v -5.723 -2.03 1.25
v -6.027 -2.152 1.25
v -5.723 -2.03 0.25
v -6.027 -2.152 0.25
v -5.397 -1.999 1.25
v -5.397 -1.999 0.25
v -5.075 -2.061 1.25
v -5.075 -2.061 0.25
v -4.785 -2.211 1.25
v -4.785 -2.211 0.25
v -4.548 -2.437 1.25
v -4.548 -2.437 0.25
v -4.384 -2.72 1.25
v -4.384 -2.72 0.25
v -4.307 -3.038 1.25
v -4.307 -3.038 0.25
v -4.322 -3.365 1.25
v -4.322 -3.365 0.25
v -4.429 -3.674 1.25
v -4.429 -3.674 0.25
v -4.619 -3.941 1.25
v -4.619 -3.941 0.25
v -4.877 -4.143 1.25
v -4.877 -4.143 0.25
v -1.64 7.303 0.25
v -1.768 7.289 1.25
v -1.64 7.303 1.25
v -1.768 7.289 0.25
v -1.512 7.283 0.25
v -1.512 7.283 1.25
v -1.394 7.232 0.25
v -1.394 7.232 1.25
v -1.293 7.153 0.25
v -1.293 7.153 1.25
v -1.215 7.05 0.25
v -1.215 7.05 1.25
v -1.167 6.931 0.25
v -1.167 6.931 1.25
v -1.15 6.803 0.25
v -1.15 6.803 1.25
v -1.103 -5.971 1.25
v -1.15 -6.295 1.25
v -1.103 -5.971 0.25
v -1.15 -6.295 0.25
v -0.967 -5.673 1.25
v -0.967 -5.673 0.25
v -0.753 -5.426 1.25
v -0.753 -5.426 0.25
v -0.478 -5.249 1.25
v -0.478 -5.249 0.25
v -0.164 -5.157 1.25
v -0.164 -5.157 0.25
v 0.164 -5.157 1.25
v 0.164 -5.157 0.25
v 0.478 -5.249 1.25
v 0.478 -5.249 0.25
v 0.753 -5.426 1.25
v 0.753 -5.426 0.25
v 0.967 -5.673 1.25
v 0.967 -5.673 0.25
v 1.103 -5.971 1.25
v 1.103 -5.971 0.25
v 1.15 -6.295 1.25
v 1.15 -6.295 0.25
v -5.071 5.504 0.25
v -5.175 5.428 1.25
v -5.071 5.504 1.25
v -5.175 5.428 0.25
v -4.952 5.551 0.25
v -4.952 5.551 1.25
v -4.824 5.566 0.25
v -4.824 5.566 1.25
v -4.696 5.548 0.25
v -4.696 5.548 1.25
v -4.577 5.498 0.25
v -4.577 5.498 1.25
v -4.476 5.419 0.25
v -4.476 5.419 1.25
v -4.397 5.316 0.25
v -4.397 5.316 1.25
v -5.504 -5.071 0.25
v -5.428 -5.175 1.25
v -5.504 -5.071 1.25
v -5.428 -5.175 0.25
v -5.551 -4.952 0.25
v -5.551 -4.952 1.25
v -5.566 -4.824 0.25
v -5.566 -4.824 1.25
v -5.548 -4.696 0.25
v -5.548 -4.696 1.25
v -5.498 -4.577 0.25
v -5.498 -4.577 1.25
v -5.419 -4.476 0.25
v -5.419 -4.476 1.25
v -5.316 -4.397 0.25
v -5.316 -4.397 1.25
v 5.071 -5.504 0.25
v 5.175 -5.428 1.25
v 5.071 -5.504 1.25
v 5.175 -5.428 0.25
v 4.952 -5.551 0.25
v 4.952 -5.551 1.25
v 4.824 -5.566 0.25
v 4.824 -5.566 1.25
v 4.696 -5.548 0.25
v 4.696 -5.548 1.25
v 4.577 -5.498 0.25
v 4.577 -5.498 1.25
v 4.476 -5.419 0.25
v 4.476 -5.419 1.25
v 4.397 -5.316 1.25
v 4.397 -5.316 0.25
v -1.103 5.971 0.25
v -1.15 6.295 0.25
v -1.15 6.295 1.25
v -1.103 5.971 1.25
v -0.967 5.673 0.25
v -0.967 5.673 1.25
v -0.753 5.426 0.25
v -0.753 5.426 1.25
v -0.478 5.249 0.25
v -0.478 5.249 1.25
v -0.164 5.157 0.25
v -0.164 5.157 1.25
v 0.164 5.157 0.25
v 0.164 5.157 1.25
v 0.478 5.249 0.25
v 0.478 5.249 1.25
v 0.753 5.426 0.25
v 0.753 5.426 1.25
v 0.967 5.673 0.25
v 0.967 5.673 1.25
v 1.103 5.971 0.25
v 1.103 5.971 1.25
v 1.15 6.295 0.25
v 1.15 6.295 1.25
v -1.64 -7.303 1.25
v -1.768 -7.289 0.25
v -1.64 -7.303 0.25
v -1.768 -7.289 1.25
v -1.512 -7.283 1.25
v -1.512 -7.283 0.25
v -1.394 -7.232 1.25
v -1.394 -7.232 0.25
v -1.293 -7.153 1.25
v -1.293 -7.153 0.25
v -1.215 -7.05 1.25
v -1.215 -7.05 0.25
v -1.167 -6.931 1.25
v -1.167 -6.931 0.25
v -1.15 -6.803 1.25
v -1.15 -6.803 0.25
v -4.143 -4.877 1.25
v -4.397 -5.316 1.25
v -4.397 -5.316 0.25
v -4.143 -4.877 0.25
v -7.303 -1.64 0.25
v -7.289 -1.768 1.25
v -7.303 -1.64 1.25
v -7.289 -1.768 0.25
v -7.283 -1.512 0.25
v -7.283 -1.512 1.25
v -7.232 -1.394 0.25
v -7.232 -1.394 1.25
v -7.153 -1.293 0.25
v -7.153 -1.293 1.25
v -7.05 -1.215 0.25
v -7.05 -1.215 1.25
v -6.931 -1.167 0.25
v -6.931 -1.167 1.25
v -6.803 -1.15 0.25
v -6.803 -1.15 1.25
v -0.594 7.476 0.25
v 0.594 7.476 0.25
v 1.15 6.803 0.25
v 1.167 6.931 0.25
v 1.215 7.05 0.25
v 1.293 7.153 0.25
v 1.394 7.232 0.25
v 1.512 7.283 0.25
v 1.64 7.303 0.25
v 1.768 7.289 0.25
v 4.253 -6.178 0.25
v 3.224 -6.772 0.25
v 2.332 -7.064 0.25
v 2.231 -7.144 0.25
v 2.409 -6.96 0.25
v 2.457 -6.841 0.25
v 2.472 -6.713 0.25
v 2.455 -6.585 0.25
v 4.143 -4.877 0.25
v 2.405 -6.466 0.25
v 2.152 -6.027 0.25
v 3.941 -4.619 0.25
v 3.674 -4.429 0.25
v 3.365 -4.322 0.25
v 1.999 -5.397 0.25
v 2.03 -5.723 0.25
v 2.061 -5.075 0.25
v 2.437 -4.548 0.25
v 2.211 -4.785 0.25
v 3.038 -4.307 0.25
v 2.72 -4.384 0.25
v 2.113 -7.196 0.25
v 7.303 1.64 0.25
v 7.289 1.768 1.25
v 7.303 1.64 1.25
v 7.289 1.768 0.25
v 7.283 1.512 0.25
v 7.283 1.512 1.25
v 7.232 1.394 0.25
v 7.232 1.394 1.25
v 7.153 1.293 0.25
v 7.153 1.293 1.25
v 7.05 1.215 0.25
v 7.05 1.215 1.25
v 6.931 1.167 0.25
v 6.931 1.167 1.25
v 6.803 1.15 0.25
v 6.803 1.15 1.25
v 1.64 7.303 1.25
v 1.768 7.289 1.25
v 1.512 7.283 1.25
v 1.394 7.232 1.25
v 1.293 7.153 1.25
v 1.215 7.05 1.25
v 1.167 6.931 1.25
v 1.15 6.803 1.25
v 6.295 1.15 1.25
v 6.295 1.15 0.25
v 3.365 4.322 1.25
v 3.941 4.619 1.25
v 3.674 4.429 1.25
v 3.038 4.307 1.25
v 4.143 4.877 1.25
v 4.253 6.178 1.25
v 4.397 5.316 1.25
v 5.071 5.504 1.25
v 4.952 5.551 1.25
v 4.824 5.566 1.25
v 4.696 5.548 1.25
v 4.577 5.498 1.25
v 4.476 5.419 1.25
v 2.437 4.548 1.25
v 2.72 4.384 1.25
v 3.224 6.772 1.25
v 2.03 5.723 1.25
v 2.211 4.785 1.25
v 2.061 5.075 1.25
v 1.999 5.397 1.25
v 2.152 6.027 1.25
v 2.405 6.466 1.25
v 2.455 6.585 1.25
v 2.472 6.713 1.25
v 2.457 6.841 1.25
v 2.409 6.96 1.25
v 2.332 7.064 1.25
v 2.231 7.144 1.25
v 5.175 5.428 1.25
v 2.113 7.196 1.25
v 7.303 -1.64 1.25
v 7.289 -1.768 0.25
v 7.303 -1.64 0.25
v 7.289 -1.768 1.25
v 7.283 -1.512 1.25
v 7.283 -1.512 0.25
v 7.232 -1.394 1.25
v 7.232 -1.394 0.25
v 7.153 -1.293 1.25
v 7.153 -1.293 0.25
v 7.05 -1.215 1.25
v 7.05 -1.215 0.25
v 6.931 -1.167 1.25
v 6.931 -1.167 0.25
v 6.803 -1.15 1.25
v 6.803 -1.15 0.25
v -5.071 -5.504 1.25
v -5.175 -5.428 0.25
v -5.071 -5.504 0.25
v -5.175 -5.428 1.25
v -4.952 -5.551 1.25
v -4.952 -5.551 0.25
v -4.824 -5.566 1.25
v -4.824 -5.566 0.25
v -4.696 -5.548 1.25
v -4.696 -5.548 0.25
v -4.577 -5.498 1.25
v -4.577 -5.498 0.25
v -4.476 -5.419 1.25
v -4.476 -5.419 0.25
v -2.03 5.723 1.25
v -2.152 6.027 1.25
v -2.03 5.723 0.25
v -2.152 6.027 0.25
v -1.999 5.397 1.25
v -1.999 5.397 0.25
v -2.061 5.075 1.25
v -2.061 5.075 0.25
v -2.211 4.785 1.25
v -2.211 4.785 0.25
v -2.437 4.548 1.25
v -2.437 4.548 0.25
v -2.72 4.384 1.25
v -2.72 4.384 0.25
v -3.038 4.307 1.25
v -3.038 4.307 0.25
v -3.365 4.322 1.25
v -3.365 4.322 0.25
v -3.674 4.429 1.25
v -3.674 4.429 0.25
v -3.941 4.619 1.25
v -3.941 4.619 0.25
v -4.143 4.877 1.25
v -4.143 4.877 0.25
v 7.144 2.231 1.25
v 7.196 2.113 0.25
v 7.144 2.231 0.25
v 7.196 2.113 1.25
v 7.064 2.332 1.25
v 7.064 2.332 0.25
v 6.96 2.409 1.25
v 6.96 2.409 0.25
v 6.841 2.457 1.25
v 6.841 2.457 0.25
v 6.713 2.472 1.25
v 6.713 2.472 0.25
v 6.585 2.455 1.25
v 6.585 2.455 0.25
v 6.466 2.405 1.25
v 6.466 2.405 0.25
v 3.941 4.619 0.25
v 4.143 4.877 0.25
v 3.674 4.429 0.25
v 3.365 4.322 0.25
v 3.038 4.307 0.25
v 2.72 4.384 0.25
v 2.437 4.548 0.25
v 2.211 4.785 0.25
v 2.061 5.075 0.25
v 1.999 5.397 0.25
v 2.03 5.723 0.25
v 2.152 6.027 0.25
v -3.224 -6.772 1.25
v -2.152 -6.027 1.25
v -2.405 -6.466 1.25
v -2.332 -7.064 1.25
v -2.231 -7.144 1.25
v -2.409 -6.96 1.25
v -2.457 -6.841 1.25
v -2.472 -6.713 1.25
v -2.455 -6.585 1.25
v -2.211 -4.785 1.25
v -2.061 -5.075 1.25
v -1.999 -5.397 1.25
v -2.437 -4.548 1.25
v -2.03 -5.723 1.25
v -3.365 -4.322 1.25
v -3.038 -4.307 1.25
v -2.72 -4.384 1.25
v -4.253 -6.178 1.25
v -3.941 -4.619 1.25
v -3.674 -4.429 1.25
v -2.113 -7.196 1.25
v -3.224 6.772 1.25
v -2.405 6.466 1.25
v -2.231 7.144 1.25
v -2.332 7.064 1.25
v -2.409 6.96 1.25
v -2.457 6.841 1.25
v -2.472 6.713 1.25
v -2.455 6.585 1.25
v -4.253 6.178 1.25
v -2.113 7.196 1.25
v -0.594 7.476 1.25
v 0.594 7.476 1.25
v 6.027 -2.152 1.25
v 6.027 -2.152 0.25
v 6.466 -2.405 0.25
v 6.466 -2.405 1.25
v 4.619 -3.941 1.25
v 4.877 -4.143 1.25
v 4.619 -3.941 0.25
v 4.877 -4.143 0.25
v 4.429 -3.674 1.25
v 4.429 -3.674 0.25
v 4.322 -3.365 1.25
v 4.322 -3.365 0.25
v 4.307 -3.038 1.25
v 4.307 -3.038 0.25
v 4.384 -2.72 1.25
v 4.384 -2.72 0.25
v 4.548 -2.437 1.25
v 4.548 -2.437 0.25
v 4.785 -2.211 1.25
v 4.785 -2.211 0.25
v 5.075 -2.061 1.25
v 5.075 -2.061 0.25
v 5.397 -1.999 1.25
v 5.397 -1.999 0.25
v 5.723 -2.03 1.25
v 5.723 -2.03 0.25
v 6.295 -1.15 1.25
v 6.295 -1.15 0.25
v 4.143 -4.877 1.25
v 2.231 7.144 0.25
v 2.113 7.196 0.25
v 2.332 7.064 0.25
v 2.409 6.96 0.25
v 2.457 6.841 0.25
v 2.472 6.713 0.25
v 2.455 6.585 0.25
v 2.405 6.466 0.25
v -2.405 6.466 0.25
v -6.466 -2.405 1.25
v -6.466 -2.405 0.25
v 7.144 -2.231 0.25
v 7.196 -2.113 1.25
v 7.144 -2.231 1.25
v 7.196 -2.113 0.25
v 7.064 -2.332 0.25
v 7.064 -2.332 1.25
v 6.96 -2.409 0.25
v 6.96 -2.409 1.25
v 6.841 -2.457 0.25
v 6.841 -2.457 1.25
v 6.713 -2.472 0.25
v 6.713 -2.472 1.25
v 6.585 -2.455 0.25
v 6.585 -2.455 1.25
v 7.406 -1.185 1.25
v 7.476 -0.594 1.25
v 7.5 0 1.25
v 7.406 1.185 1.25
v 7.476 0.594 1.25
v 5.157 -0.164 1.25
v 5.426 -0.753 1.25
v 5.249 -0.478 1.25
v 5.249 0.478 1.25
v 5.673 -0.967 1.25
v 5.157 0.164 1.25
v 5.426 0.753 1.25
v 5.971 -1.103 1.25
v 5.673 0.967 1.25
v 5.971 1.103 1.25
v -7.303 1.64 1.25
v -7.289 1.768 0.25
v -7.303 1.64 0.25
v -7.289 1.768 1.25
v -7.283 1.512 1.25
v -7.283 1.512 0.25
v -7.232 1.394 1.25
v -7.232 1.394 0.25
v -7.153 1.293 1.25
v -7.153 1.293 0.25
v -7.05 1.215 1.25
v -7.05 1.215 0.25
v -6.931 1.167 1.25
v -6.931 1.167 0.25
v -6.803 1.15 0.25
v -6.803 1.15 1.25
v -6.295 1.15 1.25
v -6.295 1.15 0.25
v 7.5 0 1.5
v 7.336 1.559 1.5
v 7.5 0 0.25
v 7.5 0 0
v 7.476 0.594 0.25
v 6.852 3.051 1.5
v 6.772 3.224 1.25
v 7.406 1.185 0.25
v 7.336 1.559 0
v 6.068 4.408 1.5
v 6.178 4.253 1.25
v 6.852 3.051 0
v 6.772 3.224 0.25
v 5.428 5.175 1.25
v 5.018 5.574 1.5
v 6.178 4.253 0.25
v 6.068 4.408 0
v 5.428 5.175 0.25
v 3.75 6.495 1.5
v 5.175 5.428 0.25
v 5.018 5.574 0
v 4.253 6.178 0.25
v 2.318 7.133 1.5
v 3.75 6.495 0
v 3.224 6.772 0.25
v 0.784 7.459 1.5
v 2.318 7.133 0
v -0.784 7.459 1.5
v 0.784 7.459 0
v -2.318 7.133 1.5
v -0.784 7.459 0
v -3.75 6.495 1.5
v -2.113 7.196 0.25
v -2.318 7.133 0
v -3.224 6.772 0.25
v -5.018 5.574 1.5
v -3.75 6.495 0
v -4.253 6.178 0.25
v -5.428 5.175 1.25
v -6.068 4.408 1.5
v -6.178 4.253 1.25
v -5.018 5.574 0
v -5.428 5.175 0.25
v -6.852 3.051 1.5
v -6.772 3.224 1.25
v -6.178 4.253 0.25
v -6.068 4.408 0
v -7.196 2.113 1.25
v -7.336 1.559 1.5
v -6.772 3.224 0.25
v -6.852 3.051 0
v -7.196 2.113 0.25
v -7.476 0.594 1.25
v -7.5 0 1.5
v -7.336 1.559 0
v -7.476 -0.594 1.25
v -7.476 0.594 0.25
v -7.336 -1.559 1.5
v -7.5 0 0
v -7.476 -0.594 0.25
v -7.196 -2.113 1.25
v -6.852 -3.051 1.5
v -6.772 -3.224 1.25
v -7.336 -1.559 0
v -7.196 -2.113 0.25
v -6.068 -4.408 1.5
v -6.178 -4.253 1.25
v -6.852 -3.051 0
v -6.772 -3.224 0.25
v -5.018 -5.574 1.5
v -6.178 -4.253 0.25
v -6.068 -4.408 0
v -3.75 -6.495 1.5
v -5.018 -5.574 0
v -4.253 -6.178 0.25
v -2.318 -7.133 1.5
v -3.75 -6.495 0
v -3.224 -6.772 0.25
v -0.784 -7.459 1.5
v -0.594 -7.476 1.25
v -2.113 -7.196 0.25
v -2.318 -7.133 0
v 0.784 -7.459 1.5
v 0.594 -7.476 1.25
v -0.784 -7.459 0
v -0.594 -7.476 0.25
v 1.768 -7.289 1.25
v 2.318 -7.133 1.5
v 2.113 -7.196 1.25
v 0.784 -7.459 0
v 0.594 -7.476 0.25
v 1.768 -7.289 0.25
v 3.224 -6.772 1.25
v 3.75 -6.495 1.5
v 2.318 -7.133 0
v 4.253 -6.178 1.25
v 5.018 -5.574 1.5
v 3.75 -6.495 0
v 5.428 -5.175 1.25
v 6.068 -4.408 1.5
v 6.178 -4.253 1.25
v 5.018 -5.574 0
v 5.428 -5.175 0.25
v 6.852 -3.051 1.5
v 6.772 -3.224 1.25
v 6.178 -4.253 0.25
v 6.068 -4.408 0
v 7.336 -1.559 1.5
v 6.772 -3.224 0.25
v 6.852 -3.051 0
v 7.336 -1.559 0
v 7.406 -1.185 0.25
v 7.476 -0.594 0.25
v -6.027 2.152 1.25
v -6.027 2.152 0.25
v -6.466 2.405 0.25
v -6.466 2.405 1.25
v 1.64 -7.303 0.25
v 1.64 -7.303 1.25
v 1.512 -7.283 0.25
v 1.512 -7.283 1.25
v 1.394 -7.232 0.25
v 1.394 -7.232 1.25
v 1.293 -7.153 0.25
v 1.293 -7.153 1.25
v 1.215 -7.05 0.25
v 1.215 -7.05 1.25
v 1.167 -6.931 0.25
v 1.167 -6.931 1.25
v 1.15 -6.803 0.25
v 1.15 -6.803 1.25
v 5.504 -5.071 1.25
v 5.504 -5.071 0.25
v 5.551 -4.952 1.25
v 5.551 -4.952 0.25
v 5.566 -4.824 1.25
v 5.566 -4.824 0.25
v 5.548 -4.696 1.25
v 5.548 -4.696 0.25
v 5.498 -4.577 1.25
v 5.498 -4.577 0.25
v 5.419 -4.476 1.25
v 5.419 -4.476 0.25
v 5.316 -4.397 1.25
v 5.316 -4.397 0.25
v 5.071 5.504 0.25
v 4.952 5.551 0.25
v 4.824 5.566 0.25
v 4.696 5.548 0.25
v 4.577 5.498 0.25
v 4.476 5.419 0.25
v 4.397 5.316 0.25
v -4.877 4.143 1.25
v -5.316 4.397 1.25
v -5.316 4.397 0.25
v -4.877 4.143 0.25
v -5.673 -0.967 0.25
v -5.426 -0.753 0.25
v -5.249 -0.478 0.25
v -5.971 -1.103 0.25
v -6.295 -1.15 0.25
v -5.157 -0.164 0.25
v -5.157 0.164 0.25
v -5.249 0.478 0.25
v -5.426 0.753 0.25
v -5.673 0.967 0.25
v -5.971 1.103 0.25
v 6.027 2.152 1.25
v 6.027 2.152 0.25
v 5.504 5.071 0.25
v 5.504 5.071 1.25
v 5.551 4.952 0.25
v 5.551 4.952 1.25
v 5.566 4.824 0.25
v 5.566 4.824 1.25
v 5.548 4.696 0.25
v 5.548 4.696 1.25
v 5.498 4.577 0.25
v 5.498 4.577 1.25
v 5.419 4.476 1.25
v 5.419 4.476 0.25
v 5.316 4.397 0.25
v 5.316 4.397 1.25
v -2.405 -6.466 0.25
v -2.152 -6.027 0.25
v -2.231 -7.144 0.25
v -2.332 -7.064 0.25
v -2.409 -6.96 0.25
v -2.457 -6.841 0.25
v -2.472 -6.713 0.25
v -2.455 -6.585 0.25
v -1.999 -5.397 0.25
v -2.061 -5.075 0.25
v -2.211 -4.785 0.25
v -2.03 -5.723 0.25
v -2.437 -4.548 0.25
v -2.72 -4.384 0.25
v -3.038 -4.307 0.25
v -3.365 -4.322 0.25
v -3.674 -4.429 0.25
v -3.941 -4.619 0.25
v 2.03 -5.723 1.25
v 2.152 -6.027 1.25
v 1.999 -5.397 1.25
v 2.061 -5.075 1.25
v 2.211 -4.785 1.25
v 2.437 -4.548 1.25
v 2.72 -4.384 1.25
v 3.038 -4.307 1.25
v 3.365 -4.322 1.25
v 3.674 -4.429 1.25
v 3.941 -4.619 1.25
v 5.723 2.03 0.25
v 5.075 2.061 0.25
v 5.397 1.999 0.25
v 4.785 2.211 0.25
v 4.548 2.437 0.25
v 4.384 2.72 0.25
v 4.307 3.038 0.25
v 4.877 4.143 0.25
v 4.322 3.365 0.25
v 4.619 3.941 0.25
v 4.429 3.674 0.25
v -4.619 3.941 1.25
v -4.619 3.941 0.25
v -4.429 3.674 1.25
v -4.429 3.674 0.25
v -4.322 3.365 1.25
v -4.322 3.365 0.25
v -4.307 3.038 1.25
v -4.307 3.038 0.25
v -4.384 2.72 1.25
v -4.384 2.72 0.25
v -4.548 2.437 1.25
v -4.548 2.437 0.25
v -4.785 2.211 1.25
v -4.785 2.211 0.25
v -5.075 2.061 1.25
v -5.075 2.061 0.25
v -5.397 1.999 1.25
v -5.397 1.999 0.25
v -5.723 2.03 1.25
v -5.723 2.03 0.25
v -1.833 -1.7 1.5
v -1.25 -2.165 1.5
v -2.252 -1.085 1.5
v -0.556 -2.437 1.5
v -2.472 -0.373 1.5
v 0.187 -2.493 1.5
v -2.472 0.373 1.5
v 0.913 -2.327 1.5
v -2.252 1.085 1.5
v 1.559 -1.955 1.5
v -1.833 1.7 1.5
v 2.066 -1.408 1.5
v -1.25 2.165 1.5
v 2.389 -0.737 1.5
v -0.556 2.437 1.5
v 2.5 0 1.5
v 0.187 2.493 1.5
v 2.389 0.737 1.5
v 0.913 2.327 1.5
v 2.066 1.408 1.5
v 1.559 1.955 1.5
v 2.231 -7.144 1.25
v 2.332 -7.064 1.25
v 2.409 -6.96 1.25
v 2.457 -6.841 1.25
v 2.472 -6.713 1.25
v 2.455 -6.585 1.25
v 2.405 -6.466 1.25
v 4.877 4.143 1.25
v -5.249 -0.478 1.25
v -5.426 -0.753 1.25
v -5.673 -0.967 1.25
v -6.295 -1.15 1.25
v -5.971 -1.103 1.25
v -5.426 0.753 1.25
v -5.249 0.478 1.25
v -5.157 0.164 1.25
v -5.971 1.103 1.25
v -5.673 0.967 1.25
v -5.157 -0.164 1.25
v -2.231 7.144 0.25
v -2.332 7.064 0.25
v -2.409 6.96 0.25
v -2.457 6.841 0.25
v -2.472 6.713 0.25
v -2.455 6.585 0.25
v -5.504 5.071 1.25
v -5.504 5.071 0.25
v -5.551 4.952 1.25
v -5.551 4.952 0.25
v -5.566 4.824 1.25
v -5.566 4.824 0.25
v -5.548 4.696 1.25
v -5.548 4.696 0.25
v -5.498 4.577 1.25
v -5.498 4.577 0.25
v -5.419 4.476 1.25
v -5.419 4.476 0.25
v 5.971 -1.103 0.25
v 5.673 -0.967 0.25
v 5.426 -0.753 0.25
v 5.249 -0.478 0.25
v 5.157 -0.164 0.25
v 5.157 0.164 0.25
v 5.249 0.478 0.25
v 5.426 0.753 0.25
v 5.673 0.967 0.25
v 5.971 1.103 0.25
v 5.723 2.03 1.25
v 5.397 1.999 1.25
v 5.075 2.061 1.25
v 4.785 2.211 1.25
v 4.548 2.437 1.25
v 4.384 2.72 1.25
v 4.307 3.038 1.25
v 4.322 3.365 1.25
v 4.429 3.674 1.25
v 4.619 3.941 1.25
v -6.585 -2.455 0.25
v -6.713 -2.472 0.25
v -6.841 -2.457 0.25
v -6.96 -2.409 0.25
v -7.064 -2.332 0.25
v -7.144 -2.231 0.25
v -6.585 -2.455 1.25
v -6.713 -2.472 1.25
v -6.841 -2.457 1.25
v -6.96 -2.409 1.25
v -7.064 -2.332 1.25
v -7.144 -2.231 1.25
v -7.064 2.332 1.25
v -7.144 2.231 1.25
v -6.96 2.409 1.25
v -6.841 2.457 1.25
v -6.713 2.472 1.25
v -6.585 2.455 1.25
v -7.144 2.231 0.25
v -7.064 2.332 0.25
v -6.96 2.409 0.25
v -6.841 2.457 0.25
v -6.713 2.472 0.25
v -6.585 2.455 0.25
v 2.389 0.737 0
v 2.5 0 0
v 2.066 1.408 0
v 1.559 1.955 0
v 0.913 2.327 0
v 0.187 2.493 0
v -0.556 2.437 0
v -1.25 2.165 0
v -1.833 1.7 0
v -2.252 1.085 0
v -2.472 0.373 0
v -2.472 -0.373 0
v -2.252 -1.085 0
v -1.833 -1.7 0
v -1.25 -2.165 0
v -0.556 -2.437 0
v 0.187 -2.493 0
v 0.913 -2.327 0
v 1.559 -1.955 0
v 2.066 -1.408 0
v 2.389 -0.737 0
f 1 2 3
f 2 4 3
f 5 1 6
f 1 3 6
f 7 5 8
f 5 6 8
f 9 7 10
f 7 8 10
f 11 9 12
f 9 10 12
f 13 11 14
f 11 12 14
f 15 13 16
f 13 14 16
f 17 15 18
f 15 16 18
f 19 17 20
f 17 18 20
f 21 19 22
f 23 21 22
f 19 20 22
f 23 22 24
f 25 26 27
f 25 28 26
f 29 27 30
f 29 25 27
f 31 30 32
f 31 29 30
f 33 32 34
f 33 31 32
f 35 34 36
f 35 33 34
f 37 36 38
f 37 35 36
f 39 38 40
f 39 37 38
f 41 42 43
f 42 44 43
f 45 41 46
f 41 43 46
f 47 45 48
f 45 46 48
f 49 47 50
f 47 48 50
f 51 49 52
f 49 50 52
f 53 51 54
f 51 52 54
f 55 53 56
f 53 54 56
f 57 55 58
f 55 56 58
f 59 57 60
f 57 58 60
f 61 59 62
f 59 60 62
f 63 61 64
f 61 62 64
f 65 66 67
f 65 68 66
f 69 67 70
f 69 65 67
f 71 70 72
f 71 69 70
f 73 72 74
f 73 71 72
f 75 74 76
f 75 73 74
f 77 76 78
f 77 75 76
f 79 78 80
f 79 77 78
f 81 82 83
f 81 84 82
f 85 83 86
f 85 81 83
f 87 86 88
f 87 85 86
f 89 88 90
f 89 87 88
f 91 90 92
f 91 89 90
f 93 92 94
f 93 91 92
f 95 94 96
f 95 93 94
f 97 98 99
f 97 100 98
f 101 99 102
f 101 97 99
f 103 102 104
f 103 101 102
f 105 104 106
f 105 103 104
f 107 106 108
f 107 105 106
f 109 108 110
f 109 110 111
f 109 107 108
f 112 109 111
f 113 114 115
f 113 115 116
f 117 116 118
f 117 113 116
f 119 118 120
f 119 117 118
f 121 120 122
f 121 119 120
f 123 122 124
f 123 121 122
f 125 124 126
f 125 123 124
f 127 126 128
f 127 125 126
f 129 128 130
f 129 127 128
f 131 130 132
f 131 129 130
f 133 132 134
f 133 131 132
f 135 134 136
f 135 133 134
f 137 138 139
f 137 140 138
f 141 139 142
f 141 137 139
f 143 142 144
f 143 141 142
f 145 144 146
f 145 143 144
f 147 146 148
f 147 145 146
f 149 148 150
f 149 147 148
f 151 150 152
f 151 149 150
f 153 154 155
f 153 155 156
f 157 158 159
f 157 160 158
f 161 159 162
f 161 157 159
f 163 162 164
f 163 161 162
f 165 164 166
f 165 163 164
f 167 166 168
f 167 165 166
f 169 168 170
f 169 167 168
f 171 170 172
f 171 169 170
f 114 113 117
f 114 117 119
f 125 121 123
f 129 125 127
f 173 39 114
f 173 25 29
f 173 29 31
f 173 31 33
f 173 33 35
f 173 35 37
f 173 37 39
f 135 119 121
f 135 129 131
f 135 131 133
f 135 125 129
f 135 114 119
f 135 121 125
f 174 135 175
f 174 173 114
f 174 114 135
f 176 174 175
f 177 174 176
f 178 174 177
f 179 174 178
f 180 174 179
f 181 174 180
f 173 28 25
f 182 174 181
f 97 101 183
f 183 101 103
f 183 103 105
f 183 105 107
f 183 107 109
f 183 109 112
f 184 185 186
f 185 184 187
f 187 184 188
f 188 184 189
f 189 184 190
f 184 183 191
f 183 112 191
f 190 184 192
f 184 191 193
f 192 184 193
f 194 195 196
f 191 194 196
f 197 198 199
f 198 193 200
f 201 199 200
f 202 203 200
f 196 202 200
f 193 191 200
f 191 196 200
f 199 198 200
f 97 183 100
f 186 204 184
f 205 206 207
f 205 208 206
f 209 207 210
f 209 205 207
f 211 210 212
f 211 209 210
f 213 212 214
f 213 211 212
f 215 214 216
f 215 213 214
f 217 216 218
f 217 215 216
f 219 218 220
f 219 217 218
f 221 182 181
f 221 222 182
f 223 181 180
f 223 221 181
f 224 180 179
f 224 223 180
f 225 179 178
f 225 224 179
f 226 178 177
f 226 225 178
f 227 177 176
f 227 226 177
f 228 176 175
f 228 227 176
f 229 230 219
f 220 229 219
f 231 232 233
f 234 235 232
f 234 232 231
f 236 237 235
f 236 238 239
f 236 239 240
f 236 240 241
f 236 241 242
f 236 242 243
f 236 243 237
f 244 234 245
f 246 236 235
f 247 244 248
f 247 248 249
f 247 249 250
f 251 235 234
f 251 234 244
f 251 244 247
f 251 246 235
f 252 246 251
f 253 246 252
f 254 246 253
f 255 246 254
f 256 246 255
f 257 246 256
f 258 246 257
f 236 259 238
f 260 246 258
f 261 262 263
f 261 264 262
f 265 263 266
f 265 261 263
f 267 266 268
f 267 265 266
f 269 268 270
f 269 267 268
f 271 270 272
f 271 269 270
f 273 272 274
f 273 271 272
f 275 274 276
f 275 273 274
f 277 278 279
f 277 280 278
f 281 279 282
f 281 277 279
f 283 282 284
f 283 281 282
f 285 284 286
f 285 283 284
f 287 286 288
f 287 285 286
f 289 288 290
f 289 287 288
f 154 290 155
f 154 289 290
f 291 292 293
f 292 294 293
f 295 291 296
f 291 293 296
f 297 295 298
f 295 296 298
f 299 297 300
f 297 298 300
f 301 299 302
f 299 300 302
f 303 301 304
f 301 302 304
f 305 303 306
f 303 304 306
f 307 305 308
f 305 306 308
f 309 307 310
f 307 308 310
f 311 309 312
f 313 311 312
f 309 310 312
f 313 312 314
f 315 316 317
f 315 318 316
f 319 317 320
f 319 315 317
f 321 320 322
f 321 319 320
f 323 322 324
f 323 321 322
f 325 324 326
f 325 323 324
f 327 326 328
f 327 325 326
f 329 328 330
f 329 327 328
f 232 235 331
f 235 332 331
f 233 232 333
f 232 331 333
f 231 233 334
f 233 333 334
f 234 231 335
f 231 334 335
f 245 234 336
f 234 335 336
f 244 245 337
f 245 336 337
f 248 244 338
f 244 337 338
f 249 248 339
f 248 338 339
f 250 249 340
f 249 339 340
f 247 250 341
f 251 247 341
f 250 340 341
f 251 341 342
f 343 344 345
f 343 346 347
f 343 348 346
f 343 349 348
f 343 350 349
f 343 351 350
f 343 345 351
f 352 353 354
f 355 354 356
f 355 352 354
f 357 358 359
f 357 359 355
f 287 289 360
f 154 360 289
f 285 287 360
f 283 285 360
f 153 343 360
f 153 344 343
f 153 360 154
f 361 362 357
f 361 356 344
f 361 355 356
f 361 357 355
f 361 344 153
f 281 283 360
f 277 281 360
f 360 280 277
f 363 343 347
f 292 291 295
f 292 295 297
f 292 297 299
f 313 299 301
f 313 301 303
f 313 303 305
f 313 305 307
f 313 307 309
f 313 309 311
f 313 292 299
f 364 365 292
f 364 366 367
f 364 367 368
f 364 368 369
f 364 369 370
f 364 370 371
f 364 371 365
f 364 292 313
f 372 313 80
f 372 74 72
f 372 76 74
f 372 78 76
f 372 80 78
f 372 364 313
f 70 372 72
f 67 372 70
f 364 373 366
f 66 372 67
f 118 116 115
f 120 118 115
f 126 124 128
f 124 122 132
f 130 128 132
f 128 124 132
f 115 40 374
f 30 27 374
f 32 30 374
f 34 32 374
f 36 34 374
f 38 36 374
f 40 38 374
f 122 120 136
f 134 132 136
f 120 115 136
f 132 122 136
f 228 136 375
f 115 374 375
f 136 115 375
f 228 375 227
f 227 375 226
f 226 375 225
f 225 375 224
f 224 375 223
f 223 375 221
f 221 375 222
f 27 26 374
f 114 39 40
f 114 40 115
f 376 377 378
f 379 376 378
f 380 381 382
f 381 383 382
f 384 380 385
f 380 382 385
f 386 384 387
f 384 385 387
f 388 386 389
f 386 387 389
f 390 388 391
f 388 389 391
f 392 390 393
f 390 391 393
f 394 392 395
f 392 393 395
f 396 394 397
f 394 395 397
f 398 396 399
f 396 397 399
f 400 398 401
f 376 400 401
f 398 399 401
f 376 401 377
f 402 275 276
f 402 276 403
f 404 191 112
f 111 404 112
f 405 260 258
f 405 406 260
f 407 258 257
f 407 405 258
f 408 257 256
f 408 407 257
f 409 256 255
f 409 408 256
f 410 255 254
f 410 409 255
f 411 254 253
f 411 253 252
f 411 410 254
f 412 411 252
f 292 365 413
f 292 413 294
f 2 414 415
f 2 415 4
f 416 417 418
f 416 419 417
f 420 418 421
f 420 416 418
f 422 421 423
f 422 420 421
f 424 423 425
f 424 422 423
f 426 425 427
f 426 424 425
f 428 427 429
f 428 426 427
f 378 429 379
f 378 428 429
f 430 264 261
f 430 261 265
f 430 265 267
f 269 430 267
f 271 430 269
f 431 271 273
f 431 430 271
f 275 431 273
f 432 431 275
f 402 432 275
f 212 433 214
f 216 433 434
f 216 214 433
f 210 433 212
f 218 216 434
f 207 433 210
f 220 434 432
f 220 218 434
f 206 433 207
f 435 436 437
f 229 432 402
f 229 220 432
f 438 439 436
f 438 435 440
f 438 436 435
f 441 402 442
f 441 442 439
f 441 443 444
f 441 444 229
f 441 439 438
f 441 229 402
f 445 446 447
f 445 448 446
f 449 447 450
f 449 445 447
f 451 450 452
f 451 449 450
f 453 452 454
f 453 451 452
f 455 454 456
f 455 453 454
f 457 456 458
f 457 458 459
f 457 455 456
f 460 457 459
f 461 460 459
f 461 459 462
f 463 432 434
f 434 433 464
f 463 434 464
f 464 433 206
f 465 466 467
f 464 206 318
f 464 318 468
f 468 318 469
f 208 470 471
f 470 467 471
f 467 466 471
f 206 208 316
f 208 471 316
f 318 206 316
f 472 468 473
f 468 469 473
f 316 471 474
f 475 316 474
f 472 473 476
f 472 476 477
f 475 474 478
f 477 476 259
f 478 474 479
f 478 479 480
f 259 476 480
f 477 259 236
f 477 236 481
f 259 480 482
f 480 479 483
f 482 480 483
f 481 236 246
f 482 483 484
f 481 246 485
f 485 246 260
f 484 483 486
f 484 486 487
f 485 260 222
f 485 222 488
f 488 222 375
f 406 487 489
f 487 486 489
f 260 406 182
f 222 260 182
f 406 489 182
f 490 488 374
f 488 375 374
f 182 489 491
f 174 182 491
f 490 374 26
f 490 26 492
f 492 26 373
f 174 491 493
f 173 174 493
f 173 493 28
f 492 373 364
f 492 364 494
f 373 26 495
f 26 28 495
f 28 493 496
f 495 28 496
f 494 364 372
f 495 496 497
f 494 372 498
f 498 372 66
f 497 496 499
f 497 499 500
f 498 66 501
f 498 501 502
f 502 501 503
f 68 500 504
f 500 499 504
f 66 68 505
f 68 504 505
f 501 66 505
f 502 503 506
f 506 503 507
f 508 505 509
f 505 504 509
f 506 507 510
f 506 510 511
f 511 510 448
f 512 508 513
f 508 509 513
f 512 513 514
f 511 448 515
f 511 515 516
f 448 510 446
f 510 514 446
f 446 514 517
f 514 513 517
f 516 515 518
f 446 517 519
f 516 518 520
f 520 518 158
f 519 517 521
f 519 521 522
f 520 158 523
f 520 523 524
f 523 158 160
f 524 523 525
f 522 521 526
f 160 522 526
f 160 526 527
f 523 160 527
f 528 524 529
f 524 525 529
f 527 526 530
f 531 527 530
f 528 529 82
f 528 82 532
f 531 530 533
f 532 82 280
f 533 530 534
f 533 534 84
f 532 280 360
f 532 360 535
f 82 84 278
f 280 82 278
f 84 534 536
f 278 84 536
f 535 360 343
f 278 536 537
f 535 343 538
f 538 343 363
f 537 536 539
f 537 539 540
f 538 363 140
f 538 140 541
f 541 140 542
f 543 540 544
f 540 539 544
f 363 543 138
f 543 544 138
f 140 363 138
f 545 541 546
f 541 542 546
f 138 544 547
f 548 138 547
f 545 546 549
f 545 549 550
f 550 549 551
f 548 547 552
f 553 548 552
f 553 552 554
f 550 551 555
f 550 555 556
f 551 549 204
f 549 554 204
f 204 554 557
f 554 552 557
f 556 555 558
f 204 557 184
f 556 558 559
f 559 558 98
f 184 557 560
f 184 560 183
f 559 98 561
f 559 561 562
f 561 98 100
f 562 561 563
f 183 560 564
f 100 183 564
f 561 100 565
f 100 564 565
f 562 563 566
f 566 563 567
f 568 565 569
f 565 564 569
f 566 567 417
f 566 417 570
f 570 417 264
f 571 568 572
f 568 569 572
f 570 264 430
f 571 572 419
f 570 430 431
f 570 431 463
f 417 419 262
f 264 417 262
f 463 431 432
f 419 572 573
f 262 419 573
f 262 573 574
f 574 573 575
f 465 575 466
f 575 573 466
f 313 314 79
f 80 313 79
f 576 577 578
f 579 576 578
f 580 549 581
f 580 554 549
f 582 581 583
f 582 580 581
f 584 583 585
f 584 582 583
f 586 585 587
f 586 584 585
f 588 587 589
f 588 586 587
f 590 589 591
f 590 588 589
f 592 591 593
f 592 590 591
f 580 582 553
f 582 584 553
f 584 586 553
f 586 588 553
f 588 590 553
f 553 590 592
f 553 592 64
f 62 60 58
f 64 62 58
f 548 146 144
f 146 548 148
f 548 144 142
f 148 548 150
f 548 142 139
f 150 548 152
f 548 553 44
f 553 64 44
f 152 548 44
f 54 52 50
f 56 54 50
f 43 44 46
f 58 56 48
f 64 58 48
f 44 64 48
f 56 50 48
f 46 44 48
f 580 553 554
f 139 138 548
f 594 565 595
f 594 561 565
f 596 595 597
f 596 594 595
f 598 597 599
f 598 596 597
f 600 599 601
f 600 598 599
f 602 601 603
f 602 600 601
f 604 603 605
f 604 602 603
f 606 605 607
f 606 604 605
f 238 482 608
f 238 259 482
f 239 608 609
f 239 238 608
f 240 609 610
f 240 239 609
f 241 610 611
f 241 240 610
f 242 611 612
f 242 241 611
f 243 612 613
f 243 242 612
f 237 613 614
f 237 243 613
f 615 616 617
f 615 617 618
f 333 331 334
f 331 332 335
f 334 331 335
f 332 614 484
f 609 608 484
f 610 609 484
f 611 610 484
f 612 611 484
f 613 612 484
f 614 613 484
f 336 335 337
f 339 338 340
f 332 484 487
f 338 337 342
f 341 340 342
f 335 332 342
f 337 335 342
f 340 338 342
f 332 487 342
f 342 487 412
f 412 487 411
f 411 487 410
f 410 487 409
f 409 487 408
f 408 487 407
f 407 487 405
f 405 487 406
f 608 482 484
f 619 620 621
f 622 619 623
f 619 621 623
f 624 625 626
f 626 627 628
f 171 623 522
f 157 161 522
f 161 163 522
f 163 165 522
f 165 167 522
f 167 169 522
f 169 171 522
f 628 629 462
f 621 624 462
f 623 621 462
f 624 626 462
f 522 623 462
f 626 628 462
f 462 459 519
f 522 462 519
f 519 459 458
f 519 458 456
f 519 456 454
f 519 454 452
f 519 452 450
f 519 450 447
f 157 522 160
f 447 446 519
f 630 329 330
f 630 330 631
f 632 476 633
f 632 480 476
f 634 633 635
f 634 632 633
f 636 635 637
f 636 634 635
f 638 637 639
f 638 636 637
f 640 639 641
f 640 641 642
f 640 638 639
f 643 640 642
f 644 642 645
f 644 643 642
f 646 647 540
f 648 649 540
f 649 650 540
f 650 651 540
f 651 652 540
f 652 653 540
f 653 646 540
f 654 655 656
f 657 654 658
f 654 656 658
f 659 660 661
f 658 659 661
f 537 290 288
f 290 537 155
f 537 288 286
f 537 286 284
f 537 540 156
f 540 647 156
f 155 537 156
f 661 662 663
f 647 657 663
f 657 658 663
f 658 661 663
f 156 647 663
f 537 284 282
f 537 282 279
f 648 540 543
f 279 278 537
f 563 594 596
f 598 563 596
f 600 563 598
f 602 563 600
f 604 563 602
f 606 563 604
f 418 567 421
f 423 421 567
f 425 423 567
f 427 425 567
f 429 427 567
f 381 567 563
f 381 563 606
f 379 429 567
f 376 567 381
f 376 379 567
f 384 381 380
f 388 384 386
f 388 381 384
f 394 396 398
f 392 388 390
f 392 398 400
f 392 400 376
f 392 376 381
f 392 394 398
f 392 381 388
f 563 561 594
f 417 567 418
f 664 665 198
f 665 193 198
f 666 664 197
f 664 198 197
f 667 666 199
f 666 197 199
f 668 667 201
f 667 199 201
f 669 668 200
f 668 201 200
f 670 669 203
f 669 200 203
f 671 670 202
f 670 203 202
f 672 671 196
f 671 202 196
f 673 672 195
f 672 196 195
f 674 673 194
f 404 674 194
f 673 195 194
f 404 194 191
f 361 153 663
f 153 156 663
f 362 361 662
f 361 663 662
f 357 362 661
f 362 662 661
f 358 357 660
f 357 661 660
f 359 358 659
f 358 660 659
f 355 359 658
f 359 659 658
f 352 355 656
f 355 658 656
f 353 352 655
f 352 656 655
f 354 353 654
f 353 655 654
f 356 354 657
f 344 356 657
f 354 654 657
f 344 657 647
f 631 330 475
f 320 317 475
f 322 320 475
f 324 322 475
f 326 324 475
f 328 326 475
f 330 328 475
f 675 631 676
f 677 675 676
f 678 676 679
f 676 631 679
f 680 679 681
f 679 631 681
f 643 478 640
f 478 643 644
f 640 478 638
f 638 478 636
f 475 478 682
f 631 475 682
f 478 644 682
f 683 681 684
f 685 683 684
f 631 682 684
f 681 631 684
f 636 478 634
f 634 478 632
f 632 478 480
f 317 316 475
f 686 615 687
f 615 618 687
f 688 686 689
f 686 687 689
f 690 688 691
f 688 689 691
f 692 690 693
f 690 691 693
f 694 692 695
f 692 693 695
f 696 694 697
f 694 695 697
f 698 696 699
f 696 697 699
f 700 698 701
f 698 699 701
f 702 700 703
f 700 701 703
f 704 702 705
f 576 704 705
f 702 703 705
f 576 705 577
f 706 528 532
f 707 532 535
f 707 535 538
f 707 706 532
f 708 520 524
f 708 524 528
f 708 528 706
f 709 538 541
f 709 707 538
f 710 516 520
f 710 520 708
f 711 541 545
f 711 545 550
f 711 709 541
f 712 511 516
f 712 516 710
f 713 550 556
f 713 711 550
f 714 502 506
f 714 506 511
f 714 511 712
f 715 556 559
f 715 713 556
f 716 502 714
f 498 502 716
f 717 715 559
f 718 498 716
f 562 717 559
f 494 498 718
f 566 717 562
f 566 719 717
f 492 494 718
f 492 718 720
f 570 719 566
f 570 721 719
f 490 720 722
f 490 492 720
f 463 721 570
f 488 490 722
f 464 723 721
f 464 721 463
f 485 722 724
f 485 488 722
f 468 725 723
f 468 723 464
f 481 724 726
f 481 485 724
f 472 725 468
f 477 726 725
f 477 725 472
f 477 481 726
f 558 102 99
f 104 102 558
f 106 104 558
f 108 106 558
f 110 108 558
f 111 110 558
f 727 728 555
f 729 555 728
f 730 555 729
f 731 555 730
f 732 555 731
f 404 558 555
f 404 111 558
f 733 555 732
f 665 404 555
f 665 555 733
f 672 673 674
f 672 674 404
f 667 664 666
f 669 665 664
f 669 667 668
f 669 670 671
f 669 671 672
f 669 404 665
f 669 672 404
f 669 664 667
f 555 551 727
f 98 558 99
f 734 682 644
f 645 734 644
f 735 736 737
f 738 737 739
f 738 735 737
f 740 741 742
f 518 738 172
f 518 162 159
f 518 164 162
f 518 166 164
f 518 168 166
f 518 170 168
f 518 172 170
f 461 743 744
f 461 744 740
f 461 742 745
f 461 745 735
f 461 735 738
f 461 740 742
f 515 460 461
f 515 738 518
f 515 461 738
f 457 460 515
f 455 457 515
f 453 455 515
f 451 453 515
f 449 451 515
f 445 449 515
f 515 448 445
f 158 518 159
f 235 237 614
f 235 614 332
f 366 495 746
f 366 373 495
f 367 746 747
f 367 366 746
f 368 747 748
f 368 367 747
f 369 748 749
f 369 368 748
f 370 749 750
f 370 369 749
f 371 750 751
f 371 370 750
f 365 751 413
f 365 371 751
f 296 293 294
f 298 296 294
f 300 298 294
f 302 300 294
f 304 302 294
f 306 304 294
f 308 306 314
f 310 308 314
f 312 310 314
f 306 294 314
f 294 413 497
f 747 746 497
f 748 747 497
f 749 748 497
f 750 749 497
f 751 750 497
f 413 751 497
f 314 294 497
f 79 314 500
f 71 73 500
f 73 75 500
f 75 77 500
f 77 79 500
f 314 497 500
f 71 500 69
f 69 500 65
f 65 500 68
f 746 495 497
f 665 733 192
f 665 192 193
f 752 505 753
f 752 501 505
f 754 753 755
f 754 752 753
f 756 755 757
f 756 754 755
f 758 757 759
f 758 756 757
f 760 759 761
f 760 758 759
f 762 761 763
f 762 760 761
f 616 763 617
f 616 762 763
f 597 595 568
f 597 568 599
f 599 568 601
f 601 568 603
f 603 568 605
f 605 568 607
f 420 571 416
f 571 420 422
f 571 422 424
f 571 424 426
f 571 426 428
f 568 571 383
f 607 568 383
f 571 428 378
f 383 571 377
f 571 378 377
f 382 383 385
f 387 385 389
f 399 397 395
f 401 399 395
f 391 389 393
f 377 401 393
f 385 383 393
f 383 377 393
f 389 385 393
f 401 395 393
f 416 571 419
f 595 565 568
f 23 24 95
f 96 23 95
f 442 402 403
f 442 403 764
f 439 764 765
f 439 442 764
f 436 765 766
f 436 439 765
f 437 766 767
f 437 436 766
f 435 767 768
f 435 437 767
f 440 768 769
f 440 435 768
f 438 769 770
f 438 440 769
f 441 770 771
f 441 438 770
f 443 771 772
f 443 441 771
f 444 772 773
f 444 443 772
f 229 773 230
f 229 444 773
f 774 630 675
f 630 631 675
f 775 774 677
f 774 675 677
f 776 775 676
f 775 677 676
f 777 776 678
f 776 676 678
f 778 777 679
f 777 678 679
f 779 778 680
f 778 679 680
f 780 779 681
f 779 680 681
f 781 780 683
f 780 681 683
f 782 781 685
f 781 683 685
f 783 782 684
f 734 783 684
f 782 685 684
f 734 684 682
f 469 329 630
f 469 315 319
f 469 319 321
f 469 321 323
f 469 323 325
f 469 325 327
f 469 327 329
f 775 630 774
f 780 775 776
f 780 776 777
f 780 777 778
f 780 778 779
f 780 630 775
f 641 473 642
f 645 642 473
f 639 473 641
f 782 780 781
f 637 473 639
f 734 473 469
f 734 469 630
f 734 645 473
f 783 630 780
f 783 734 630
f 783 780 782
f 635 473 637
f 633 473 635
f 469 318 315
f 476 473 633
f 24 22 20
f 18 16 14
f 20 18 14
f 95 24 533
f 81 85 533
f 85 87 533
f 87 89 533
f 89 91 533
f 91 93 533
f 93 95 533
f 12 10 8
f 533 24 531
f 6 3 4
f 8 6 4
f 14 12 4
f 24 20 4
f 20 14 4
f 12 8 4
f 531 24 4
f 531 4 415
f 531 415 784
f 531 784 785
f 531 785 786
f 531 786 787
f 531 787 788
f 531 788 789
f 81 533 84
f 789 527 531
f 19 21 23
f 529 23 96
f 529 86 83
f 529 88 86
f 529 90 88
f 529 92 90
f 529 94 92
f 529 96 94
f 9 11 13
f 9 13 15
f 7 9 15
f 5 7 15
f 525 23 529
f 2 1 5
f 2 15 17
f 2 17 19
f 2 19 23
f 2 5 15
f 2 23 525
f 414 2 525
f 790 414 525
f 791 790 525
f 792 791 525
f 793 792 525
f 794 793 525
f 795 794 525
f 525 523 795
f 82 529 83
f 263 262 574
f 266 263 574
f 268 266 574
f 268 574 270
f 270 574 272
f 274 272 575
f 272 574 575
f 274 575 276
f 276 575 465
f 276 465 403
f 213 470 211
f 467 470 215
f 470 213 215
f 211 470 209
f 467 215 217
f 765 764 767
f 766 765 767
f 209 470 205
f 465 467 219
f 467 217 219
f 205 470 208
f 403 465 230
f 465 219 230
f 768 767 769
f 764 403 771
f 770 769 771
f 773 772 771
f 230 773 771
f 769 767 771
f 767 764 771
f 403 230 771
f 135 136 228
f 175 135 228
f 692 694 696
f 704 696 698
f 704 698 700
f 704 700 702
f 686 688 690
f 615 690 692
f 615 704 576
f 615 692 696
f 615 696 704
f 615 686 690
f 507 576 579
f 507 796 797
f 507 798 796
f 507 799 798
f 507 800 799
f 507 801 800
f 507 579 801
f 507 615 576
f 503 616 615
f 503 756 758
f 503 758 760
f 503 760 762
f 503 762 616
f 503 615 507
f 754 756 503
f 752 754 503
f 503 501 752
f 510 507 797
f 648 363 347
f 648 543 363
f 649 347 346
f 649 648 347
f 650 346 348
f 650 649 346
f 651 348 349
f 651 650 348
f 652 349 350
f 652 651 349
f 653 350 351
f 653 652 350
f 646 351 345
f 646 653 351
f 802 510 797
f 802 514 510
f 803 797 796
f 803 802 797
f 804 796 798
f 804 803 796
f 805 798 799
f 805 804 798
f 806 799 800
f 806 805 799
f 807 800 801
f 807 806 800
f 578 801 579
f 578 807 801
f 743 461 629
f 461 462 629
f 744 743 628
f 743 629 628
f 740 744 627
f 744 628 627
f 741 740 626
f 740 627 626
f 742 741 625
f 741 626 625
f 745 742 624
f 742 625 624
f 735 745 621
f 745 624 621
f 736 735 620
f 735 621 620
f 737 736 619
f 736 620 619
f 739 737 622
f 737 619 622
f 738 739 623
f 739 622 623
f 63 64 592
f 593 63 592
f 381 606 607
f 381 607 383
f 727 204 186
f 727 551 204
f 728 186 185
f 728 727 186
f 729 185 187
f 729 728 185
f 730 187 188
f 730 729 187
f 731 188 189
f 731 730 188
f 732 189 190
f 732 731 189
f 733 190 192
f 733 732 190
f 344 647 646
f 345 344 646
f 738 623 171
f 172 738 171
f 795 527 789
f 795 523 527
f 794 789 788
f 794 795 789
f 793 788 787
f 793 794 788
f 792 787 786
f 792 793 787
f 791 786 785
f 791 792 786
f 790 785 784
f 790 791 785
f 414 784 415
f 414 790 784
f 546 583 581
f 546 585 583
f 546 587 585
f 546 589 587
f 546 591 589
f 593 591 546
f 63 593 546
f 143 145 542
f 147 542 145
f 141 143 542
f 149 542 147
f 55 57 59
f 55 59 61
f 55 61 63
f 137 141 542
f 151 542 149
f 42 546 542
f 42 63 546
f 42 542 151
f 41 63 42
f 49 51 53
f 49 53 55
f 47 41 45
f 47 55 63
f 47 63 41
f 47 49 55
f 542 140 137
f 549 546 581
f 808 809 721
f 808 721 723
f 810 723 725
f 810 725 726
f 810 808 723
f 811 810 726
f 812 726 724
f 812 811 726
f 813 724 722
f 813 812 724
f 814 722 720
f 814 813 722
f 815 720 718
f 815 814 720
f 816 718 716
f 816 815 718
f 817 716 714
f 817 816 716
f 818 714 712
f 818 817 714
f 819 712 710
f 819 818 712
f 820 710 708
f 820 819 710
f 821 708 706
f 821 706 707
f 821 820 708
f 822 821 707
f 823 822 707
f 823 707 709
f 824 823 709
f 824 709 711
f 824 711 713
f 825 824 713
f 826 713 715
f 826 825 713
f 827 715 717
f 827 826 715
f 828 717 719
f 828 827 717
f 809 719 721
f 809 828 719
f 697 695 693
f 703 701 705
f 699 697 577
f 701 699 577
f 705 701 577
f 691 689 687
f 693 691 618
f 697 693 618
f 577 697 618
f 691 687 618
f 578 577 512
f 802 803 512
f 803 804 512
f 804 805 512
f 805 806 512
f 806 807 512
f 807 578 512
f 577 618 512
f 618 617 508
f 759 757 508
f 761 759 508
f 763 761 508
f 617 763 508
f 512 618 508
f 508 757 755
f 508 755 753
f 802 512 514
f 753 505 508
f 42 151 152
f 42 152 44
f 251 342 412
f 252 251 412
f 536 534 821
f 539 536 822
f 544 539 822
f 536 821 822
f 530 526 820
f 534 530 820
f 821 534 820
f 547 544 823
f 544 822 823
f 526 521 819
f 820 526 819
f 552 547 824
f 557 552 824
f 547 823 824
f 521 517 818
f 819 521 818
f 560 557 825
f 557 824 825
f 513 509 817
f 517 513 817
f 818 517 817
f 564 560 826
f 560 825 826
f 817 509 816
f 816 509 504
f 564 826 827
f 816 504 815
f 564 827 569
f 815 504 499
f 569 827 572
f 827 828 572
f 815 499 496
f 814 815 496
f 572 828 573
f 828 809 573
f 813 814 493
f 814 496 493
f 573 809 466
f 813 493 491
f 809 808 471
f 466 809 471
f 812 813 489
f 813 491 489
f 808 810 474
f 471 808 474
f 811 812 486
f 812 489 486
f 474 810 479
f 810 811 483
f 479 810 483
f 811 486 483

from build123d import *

# Parameters (mm, degrees)
SKETCH1_R               = 7.5
SKETCH1_R_2             = 2.5
BOSS_EXTRUDE1_DEPTH     = 1.5
CUT_EXTRUDE1_DEPTH      = 0.5
CUT_EXTRUDE1_DEPTH_BACK = 0.5
FILLET1_R               = 0.5


with BuildPart() as part:
    # Sketch1 → Boss-Extrude1 (new body)
    with BuildSketch(Plane.XY):
        Circle(SKETCH1_R)
        Circle(SKETCH1_R_2, mode=Mode.SUBTRACT)
    extrude(amount=BOSS_EXTRUDE1_DEPTH)

    # Sketch2 → Cut-Extrude1 (cut, two sides)
    with BuildSketch(Plane.XY.offset(0.75)) as cut_extrude1_sk:
        with BuildLine():
            Line((1.150031334, 6.294964197), (1.150031334, 7.644964197))
            Line((1.150031334, 7.644964197), (-1.150031334, 7.644964197))
            Line((-1.150031334, 7.644964197), (-1.150031334, 6.294964197))
            ThreePointArc((-1.150031334, 6.294964197), (0, 5.144932863), (1.150031334, 6.294964197))
        make_face()
        with BuildLine():
            Line((2.151525748, 6.026614578), (2.826525748, 7.195748873))
            Line((2.826525748, 7.195748873), (4.818438449, 6.045717539))
            Line((4.818438449, 6.045717539), (4.143438449, 4.876583244))
            ThreePointArc((4.143438449, 4.876583244), (2.572466432, 4.45564256), (2.151525748, 6.026614578))
        make_face()
        with BuildLine():
            Line((4.876583244, 4.143438449), (6.045717539, 4.818438449))
            Line((6.045717539, 4.818438449), (7.195748873, 2.826525748))
            Line((7.195748873, 2.826525748), (6.026614578, 2.151525748))
            ThreePointArc((6.026614578, 2.151525748), (4.45564256, 2.572466432), (4.876583244, 4.143438449))
        make_face()
        with BuildLine():
            Line((6.294964197, 1.150031334), (7.644964197, 1.150031334))
            Line((7.644964197, 1.150031334), (7.644964197, -1.150031334))
            Line((7.644964197, -1.150031334), (6.294964197, -1.150031334))
            ThreePointArc((6.294964197, -1.150031334), (5.144932863, 0), (6.294964197, 1.150031334))
        make_face()
        with BuildLine():
            Line((6.026614578, -2.151525748), (7.195748873, -2.826525748))
            Line((7.195748873, -2.826525748), (6.045717539, -4.818438449))
            Line((6.045717539, -4.818438449), (4.876583244, -4.143438449))
            ThreePointArc((4.876583244, -4.143438449), (4.45564256, -2.572466432), (6.026614578, -2.151525748))
        make_face()
        with BuildLine():
            Line((4.143438449, -4.876583244), (4.818438449, -6.045717539))
            Line((4.818438449, -6.045717539), (2.826525748, -7.195748873))
            Line((2.826525748, -7.195748873), (2.151525748, -6.026614578))
            ThreePointArc((2.151525748, -6.026614578), (2.572466432, -4.45564256), (4.143438449, -4.876583244))
        make_face()
        with BuildLine():
            Line((1.150031334, -6.294964197), (1.150031334, -7.644964197))
            Line((1.150031334, -7.644964197), (-1.150031334, -7.644964197))
            Line((-1.150031334, -7.644964197), (-1.150031334, -6.294964197))
            ThreePointArc((-1.150031334, -6.294964197), (0, -5.144932863), (1.150031334, -6.294964197))
        make_face()
        with BuildLine():
            Line((-2.151525748, -6.026614578), (-2.826525748, -7.195748873))
            Line((-2.826525748, -7.195748873), (-4.818438449, -6.045717539))
            Line((-4.818438449, -6.045717539), (-4.143438449, -4.876583244))
            ThreePointArc((-4.143438449, -4.876583244), (-2.572466432, -4.45564256), (-2.151525748, -6.026614578))
        make_face()
        with BuildLine():
            Line((-4.876583244, -4.143438449), (-6.045717539, -4.818438449))
            Line((-6.045717539, -4.818438449), (-7.195748873, -2.826525748))
            Line((-7.195748873, -2.826525748), (-6.026614578, -2.151525748))
            ThreePointArc((-6.026614578, -2.151525748), (-4.45564256, -2.572466432), (-4.876583244, -4.143438449))
        make_face()
        with BuildLine():
            Line((-6.294964197, -1.150031334), (-7.644964197, -1.150031334))
            Line((-7.644964197, -1.150031334), (-7.644964197, 1.150031334))
            Line((-7.644964197, 1.150031334), (-6.294964197, 1.150031334))
            ThreePointArc((-6.294964197, 1.150031334), (-5.144932863, 0), (-6.294964197, -1.150031334))
        make_face()
        with BuildLine():
            Line((-6.026614578, 2.151525748), (-7.195748873, 2.826525748))
            Line((-7.195748873, 2.826525748), (-6.045717539, 4.818438449))
            Line((-6.045717539, 4.818438449), (-4.876583244, 4.143438449))
            ThreePointArc((-4.876583244, 4.143438449), (-4.45564256, 2.572466432), (-6.026614578, 2.151525748))
        make_face()
        with BuildLine():
            Line((-4.143438449, 4.876583244), (-4.818438449, 6.045717539))
            Line((-4.818438449, 6.045717539), (-2.826525748, 7.195748873))
            Line((-2.826525748, 7.195748873), (-2.151525748, 6.026614578))
            ThreePointArc((-2.151525748, 6.026614578), (-2.572466432, 4.45564256), (-4.143438449, 4.876583244))
        make_face()
    extrude(amount=CUT_EXTRUDE1_DEPTH, mode=Mode.SUBTRACT)
    extrude(cut_extrude1_sk.sketch, amount=-CUT_EXTRUDE1_DEPTH_BACK, mode=Mode.SUBTRACT)

    # Fillet1
    fillet1_edges = [part.edges().sort_by_distance(p)[0] for p in [
        (-1.150031334, 7.411304064, 0.75),
        (1.150031334, 7.411304064, 0.75),
        (-7.411304064, -1.150031334, 0.75),
        (-7.411304064, 1.150031334, 0.75),
        (-6.993393262, 2.709695681, 0.75),
        (-5.843361928, 4.701608383, 0.75),
        (-4.701608383, 5.843361928, 0.75),
        (-2.709695681, 6.993393262, 0.75),
        (5.843361928, 4.701608383, 0.75),
        (6.993393262, 2.709695681, 0.75),
        (2.709695681, 6.993393262, 0.75),
        (4.701608383, 5.843361928, 0.75),
        (7.411304064, 1.150031334, 0.75),
        (7.411304064, -1.150031334, 0.75),
        (6.993393262, -2.709695681, 0.75),
        (5.843361928, -4.701608383, 0.75),
        (4.701608383, -5.843361928, 0.75),
        (2.709695681, -6.993393262, 0.75),
        (1.150031334, -7.411304064, 0.75),
        (-1.150031334, -7.411304064, 0.75),
        (-5.843361928, -4.701608383, 0.75),
        (-6.993393262, -2.709695681, 0.75),
        (-2.709695681, -6.993393262, 0.75),
        (-4.701608383, -5.843361928, 0.75),
    ]]
    fillet(fillet1_edges, radius=FILLET1_R)


solid = part.part
